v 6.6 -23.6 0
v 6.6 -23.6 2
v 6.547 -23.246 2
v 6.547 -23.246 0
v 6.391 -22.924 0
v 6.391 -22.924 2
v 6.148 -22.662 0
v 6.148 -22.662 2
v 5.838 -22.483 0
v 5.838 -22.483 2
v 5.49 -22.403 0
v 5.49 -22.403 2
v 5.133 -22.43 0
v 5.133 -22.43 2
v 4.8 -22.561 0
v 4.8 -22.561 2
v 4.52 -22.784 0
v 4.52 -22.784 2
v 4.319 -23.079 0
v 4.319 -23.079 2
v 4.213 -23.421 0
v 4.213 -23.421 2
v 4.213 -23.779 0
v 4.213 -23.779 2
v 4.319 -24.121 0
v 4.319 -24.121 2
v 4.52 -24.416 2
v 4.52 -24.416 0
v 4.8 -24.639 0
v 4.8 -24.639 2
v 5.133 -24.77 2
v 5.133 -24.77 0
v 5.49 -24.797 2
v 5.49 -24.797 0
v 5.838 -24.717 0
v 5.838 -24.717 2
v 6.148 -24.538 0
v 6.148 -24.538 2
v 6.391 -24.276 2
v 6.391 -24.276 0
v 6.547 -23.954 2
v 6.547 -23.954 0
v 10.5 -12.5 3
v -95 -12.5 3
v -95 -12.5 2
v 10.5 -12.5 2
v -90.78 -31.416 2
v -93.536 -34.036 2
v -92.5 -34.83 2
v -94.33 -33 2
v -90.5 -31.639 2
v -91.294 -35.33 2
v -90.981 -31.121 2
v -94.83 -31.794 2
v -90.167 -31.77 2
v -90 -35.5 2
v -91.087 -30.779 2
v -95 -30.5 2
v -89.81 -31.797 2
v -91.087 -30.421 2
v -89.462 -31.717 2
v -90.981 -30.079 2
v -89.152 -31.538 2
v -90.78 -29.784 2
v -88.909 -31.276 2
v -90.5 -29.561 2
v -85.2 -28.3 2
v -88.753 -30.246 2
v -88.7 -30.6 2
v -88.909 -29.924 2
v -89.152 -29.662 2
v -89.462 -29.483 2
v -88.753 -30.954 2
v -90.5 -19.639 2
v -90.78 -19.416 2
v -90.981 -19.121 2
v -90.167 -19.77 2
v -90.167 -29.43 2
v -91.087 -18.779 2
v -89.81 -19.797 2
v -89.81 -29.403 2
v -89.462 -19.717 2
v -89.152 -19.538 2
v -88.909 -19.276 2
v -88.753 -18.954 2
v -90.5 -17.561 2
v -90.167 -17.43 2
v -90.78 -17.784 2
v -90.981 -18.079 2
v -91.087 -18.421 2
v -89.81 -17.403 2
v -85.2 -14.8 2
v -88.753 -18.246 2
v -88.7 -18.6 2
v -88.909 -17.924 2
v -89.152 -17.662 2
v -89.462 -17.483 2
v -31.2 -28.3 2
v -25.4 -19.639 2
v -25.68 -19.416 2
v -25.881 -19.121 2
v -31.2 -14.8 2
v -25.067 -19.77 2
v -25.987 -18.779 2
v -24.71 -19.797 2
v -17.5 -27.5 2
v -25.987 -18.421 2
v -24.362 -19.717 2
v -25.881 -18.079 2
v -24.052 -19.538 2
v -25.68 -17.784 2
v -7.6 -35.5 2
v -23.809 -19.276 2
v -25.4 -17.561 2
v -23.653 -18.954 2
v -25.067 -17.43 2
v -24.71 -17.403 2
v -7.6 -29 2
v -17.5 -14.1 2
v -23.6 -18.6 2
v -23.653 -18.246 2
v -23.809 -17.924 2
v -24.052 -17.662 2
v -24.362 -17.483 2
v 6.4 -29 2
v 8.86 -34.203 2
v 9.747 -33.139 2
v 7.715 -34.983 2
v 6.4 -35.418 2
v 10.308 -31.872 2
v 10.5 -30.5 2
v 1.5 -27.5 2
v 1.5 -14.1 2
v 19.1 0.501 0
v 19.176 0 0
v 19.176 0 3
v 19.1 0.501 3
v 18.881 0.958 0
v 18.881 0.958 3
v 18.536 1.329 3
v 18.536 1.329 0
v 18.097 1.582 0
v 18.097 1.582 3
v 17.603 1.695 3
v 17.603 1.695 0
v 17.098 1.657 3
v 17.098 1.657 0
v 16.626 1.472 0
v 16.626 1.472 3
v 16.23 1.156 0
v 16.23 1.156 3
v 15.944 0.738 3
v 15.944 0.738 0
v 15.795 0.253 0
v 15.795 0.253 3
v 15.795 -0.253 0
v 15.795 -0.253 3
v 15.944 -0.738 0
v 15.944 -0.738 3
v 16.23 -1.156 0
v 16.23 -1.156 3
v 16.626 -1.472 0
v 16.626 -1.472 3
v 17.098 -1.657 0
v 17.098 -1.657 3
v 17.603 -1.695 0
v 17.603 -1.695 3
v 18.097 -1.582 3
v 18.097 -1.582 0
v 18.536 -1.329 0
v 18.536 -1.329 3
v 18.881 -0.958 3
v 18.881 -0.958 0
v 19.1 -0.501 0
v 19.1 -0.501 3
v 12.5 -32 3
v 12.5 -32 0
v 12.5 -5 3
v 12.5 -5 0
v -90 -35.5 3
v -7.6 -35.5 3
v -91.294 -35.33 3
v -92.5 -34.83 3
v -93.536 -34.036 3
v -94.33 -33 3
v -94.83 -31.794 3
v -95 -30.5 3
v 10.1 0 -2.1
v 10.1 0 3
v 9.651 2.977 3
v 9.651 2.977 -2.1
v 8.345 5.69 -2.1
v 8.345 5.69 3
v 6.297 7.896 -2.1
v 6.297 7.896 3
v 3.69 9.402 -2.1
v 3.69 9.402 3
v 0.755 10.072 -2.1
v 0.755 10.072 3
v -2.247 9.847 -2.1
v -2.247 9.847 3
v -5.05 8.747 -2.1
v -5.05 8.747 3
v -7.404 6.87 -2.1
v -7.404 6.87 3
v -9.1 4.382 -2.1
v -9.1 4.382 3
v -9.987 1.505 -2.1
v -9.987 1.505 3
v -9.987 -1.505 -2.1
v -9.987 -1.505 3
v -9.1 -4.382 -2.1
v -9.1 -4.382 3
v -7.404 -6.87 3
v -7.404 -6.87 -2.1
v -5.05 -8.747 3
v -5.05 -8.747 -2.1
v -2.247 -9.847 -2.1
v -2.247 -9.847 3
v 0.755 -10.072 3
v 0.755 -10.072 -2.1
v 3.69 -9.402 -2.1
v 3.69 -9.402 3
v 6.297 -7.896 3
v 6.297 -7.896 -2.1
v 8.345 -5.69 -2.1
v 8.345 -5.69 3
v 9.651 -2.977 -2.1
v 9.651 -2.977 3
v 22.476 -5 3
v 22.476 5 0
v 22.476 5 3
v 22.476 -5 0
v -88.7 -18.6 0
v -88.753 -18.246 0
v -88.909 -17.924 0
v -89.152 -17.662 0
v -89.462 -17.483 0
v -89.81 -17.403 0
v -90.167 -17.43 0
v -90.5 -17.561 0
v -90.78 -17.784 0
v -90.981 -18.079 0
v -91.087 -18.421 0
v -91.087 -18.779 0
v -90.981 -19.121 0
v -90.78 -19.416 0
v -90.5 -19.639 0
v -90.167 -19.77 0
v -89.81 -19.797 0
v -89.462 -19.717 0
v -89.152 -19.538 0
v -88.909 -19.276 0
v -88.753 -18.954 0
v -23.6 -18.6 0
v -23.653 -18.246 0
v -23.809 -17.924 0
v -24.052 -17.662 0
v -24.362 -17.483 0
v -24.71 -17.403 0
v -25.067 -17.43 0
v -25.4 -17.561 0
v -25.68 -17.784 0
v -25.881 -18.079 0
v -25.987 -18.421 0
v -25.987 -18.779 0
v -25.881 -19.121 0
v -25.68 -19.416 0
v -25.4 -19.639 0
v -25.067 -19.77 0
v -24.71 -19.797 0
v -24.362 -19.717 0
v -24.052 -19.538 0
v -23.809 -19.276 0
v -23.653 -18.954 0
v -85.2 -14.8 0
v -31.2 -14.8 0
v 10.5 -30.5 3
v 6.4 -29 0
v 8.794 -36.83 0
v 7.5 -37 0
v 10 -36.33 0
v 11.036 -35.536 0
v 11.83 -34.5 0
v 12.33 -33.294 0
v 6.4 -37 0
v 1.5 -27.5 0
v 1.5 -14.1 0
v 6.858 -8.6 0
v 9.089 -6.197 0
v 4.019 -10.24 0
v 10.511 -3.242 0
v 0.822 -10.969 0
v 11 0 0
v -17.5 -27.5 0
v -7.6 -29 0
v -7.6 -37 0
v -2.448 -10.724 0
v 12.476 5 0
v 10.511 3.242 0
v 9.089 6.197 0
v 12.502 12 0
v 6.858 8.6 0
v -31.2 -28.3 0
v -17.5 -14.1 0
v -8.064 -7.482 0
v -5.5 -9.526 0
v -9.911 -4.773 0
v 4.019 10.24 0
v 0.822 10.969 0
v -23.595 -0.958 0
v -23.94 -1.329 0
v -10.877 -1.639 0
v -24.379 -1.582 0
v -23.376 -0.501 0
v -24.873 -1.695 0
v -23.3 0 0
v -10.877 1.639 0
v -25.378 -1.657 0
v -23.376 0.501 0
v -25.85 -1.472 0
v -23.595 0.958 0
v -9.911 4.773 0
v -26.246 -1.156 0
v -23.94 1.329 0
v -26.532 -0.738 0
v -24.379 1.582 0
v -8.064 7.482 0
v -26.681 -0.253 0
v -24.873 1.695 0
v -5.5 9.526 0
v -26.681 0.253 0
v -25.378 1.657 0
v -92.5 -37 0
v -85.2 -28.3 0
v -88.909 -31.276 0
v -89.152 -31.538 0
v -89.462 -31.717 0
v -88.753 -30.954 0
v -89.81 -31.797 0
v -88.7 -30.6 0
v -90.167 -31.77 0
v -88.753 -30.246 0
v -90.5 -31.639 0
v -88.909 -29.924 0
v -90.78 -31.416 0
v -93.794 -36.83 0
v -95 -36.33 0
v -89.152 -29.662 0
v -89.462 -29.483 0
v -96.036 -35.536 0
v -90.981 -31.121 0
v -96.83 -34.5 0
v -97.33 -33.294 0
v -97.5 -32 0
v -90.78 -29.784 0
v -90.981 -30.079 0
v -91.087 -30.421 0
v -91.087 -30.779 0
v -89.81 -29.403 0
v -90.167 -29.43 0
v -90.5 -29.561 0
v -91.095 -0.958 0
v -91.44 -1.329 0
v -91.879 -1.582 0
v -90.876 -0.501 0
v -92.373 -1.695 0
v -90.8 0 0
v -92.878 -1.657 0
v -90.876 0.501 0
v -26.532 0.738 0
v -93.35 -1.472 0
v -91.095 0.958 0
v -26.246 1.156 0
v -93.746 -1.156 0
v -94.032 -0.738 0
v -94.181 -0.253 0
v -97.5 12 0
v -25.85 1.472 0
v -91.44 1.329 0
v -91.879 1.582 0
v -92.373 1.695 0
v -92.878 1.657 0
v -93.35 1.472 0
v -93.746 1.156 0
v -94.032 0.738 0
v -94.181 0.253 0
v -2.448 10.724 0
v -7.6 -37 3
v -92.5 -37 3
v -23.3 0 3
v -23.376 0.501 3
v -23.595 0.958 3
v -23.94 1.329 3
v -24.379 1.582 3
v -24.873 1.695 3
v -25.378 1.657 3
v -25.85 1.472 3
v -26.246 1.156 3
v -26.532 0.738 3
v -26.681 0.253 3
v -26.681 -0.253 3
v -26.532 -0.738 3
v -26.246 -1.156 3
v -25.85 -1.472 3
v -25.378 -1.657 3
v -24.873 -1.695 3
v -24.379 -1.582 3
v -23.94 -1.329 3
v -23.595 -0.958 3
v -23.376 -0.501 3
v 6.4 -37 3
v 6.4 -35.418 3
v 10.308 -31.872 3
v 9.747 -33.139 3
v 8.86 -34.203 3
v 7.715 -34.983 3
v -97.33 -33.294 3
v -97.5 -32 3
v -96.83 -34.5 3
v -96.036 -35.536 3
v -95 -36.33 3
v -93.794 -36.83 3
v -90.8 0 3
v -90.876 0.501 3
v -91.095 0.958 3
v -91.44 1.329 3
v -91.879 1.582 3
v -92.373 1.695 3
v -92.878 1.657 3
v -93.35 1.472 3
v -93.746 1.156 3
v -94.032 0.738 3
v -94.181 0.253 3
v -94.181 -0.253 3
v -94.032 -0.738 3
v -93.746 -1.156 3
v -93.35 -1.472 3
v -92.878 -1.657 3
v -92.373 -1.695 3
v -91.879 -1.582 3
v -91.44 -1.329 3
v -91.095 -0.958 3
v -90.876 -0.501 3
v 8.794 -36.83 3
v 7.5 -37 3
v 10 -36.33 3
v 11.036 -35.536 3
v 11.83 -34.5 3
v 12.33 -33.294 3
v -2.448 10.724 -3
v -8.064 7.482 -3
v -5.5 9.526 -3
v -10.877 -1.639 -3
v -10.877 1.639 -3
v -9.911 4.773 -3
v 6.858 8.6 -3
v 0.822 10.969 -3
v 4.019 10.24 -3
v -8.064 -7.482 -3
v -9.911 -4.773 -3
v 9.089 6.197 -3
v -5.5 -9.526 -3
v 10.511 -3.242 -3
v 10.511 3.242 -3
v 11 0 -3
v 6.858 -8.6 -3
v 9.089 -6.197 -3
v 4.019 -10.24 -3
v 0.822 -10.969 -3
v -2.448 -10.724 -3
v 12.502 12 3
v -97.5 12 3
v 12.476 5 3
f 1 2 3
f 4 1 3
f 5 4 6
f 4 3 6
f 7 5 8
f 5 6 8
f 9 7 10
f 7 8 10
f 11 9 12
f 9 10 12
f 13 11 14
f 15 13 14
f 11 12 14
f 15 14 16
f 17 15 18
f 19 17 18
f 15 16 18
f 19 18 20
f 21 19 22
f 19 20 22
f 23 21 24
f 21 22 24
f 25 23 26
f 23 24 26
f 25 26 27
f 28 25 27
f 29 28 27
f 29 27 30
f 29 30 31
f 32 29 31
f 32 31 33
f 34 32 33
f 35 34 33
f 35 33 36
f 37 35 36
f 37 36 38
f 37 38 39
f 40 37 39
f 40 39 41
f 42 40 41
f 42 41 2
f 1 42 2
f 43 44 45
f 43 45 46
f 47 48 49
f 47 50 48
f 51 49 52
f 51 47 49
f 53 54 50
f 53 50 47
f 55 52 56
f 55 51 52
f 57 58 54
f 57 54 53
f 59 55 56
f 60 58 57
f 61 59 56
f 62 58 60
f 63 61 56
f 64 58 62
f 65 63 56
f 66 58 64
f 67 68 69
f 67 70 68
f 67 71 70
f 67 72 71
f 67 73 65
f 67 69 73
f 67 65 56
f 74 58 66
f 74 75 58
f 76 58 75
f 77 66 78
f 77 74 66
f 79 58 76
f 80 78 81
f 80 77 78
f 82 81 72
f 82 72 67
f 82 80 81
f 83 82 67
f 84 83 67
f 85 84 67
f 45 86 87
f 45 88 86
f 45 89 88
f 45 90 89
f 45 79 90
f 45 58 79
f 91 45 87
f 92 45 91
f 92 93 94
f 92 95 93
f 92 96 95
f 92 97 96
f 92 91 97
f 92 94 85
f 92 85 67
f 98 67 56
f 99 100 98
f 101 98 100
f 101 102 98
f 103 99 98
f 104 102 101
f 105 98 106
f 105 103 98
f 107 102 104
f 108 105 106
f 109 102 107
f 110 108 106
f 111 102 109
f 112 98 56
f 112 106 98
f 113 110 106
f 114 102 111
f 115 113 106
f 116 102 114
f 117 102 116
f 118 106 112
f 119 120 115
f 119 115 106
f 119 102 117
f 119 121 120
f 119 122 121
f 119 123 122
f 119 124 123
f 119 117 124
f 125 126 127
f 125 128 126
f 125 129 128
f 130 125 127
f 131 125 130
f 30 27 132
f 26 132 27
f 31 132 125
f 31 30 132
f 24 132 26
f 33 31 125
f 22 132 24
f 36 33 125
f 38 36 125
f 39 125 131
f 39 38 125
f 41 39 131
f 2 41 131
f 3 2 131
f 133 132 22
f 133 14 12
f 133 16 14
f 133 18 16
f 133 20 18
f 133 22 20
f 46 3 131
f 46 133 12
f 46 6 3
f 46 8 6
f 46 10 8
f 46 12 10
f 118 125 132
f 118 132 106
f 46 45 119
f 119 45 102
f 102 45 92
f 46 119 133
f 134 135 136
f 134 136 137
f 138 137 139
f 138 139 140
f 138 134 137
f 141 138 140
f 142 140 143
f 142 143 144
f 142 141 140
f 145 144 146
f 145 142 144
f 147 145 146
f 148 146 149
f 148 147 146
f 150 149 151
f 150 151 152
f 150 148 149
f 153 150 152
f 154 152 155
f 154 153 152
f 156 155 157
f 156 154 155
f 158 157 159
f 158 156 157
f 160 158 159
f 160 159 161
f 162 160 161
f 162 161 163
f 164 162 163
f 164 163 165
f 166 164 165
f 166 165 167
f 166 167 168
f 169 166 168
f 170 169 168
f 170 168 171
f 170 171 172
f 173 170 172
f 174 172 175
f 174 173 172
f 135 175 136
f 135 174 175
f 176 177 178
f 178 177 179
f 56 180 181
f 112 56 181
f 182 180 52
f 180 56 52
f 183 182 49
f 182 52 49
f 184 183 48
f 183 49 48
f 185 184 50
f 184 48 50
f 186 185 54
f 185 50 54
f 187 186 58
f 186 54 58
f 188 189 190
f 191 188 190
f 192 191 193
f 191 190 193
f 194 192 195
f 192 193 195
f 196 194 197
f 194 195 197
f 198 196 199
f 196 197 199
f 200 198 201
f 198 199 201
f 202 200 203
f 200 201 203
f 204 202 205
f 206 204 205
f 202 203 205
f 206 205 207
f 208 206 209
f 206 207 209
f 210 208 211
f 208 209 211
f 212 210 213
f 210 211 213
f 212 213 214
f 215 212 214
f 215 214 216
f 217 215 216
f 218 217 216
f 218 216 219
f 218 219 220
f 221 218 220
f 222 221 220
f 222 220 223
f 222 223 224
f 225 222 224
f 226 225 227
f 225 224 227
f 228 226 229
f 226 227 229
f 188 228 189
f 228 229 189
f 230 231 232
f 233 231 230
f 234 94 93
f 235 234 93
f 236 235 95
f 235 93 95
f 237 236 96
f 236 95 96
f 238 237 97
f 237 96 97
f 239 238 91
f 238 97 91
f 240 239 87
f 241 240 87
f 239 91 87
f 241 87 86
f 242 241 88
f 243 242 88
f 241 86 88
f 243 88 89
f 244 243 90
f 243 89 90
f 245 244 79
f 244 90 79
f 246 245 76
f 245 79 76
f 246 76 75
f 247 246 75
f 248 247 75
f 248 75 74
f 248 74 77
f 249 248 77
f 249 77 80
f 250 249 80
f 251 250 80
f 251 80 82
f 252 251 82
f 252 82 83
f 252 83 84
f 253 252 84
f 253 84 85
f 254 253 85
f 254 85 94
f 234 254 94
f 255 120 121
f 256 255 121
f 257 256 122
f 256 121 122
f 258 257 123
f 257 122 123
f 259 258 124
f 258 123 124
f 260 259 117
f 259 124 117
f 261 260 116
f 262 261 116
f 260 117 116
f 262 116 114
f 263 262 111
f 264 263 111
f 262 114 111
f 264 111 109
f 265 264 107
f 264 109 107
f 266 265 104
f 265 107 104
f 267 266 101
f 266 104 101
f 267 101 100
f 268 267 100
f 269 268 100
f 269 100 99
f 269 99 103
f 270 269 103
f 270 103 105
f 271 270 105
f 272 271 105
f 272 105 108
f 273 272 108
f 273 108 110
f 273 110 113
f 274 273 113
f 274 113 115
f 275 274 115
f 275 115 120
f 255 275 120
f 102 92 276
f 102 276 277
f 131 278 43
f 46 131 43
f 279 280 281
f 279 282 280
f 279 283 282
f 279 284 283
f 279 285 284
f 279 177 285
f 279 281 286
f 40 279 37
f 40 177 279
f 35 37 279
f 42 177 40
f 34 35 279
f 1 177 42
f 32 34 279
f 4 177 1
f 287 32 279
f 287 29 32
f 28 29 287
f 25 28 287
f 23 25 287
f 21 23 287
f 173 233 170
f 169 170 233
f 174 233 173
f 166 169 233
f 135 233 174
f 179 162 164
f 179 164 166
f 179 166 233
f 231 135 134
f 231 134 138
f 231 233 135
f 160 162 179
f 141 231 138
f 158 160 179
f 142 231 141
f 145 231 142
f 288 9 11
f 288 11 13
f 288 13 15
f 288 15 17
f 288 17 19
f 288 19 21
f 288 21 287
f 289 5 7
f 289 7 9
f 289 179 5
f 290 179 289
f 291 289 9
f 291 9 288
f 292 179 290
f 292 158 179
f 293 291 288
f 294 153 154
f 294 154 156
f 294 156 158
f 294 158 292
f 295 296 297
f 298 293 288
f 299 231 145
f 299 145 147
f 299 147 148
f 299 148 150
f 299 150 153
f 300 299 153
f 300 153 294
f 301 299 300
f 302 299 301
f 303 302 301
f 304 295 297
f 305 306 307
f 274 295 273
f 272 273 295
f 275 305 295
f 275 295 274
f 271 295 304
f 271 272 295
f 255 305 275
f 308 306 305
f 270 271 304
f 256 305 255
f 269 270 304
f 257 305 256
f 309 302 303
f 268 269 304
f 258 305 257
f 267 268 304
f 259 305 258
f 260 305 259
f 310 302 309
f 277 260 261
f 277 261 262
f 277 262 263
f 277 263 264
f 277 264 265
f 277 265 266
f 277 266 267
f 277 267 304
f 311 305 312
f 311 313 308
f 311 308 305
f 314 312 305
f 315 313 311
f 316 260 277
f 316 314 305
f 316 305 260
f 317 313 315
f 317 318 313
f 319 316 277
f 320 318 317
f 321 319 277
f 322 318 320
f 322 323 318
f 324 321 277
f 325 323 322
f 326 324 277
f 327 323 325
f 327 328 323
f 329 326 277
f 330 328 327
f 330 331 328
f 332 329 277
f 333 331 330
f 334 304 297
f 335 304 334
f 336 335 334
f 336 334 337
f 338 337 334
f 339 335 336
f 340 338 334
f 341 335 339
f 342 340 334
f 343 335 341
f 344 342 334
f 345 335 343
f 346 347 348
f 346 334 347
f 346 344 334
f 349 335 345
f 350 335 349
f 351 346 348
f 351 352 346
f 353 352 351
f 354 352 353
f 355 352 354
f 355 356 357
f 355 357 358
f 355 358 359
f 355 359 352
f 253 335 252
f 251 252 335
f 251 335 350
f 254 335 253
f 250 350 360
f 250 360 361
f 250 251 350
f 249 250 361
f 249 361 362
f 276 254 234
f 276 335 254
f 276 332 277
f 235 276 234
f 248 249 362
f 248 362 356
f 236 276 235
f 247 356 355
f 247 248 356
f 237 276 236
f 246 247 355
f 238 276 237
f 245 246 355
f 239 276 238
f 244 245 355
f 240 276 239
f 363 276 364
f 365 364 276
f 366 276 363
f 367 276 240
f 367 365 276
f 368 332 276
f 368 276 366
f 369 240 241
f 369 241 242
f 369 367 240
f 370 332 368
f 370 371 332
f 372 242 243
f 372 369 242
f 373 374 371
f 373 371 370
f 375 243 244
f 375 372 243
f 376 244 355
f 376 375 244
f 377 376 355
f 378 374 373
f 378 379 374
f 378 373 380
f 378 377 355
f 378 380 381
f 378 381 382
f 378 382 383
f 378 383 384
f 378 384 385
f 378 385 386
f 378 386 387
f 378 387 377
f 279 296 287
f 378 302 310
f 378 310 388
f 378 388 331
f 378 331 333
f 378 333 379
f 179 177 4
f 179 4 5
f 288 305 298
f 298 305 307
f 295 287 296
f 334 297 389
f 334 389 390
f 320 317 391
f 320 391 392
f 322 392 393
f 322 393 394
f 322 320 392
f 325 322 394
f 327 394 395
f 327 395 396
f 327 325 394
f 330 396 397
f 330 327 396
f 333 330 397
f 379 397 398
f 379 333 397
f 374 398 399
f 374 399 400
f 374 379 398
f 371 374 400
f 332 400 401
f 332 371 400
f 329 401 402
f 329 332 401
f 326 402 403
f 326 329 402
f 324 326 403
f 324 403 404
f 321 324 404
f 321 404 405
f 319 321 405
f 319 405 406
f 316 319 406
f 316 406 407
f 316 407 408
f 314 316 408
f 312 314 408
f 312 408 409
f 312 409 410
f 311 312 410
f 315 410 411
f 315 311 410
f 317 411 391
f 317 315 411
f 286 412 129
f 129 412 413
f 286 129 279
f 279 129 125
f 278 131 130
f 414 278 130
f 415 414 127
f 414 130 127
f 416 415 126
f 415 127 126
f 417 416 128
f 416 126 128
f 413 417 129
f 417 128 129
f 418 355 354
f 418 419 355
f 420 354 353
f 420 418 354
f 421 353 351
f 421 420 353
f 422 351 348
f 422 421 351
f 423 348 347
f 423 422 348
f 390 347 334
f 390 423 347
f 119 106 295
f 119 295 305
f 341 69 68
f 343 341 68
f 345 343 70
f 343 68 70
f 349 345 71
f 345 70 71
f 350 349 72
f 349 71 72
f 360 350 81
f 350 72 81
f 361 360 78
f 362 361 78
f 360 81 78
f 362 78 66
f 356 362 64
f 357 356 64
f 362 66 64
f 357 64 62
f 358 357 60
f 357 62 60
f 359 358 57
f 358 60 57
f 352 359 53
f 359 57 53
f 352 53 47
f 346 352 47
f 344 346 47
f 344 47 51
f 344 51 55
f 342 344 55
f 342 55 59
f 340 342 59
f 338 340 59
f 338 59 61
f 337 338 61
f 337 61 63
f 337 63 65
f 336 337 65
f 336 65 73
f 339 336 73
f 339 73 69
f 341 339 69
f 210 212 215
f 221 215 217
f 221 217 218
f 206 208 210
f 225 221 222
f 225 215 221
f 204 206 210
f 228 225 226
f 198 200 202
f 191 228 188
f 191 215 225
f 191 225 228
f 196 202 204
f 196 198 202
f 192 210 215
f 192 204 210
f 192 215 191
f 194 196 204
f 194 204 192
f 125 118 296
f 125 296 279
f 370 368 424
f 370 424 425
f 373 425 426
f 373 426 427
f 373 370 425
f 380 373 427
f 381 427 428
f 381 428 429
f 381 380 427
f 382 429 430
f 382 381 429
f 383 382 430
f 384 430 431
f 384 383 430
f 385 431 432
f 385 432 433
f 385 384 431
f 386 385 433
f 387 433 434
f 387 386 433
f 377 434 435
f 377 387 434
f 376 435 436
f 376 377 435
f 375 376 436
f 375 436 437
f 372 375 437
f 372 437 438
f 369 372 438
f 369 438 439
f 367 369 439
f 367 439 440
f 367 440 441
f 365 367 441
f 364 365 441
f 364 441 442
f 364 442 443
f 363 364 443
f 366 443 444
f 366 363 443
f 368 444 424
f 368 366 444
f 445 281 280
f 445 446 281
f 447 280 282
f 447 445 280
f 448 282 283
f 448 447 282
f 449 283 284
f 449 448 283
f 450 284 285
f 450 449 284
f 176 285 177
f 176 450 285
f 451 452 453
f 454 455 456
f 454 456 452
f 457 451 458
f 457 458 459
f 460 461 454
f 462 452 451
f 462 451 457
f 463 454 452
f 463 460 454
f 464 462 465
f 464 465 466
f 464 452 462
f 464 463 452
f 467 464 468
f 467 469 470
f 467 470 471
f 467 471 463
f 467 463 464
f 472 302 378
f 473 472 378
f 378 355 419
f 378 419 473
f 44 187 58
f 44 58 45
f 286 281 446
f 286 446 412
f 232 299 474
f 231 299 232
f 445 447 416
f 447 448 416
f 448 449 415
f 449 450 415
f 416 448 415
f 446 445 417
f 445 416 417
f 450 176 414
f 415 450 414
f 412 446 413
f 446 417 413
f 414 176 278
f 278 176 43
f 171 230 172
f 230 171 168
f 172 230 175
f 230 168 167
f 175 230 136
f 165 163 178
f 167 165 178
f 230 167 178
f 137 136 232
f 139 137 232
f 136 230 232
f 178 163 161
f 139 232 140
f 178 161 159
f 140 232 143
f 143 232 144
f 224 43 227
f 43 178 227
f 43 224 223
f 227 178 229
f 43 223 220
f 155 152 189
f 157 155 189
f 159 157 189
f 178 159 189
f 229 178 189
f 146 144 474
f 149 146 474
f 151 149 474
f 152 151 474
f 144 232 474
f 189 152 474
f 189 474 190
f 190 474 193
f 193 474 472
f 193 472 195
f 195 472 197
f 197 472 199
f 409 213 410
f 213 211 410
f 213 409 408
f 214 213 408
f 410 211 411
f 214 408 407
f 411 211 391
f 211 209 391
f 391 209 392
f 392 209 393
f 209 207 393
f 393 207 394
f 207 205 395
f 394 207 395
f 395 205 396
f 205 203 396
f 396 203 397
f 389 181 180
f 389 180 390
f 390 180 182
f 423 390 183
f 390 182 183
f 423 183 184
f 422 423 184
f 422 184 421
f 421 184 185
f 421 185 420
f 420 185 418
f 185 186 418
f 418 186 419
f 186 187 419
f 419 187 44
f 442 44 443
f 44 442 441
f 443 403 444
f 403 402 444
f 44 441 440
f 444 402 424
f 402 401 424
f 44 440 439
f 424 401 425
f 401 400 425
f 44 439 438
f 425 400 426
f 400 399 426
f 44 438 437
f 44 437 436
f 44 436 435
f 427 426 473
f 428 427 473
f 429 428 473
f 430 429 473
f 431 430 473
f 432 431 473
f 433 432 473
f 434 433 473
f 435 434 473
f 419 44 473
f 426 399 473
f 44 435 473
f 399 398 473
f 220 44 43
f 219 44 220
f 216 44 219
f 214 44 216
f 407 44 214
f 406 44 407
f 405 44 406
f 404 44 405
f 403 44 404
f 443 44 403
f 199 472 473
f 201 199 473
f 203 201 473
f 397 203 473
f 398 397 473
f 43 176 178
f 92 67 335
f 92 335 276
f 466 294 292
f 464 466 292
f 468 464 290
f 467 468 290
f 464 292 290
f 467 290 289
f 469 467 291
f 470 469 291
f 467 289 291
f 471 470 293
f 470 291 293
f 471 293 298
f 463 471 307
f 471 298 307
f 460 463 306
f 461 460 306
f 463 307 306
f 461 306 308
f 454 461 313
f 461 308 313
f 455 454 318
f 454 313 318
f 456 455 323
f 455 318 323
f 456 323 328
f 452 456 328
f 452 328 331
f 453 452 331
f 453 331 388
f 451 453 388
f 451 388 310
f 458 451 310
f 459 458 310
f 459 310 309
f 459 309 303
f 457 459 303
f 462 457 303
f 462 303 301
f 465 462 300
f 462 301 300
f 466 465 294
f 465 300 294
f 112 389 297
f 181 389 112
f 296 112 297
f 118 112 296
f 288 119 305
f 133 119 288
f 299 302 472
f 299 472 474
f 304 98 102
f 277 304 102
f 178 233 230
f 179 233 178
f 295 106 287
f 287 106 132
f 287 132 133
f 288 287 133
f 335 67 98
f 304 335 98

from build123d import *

# Parameters (mm, degrees)
SKETCH_R        = 1.7
PAD_DEPTH       = 3
SKETCH001_W     = 105.5
SKETCH001_H     = 23
POCKET_DEPTH    = 1
SKETCH002_R     = 1.2
SKETCH002_W     = 54
SKETCH002_H     = 13.5
SKETCH002_W_2   = 19
SKETCH002_H_2   = 13.4
POCKET001_DEPTH = 5
FILLET_R        = 5
FILLET001_R     = 5
FILLET002_R     = 5
FILLET003_R     = 5
SKETCH003_W     = 14
SKETCH003_H     = 8
POCKET002_DEPTH = 5
SKETCH004_R     = 11
PAD001_DEPTH    = 3
SKETCH005_R     = 10.1
POCKET003_DEPTH = 5.1


with BuildPart() as part:
    # Sketch → Pad (new body)
    with BuildSketch(Plane.XY):
        Polygon((-12.902803, 11.999952), (12.501955, 11.999952), (12.475984, 5), (22.475984, 5), (22.475984, -5), (12.5, -5), (12.5, -12), (12.5, -37), (-97.5, -37), (-97.5, 11.999952), align=None)
        with Locations((17.475984, 0)):
            Circle(SKETCH_R, mode=Mode.SUBTRACT)
        with Locations((-92.5, 0)):
            Circle(SKETCH_R, mode=Mode.SUBTRACT)
        with Locations((-25, 0)):
            Circle(SKETCH_R, mode=Mode.SUBTRACT)
    extrude(amount=PAD_DEPTH)

    # Sketch001 (on Face15 of Pad) → Pocket (cut)
    with BuildSketch(Plane.XY.offset(3)):
        with Locations((-42.25, -24)):
            Rectangle(SKETCH001_W, SKETCH001_H)
    extrude(amount=-POCKET_DEPTH, mode=Mode.SUBTRACT)

    # Sketch002 (on Face20 of Pocket) → Pocket001 (cut)
    with BuildSketch(Plane.XY.offset(2)):
        with Locations((-89.9, -18.6)):
            Circle(SKETCH002_R)
        with Locations((-89.9, -30.6)):
            Circle(SKETCH002_R)
        with Locations((-24.8, -18.6)):
            Circle(SKETCH002_R)
        with Locations((5.4, -23.6)):
            Circle(SKETCH002_R)
        with Locations((-58.2, -21.55)):
            Rectangle(SKETCH002_W, SKETCH002_H)
        with Locations((-8, -20.8)):
            Rectangle(SKETCH002_W_2, SKETCH002_H_2)
    extrude(amount=-POCKET001_DEPTH, mode=Mode.SUBTRACT)

    # Fillet
    fillet_edges = [part.edges().sort_by_distance(p)[0] for p in [
        (10.5, -35.5, 2.5),
    ]]
    fillet(fillet_edges, radius=FILLET_R)

    # Fillet001
    fillet001_edges = [part.edges().sort_by_distance(p)[0] for p in [
        (-95, -35.5, 2.5),
    ]]
    fillet(fillet001_edges, radius=FILLET001_R)

    # Fillet002
    fillet002_edges = [part.edges().sort_by_distance(p)[0] for p in [
        (-97.5, -37, 1.5),
    ]]
    fillet(fillet002_edges, radius=FILLET002_R)

    # Fillet003
    fillet003_edges = [part.edges().sort_by_distance(p)[0] for p in [
        (12.5, -37, 1.5),
    ]]
    fillet(fillet003_edges, radius=FILLET003_R)

    # Sketch003 (on Face1 of Fillet003) → Pocket002 (cut)
    with BuildSketch(Plane.XY.offset(3)):
        with Locations((-0.6, -33)):
            Rectangle(SKETCH003_W, SKETCH003_H)
    extrude(amount=-POCKET002_DEPTH, mode=Mode.SUBTRACT)

    # Sketch004 (on Face26 of Pocket002) → Pad001 (join)
    with BuildSketch(Plane(origin=(0, 0, 0), x_dir=(1, 0, 0), z_dir=(0, 0, -1))):
        Circle(SKETCH004_R)
    extrude(amount=PAD001_DEPTH)

    # Sketch005 (on Face1 of Pad001) → Pocket003 (cut)
    with BuildSketch(Plane.XY.offset(3)):
        Circle(SKETCH005_R)
    extrude(amount=-POCKET003_DEPTH, mode=Mode.SUBTRACT)


solid = part.part
